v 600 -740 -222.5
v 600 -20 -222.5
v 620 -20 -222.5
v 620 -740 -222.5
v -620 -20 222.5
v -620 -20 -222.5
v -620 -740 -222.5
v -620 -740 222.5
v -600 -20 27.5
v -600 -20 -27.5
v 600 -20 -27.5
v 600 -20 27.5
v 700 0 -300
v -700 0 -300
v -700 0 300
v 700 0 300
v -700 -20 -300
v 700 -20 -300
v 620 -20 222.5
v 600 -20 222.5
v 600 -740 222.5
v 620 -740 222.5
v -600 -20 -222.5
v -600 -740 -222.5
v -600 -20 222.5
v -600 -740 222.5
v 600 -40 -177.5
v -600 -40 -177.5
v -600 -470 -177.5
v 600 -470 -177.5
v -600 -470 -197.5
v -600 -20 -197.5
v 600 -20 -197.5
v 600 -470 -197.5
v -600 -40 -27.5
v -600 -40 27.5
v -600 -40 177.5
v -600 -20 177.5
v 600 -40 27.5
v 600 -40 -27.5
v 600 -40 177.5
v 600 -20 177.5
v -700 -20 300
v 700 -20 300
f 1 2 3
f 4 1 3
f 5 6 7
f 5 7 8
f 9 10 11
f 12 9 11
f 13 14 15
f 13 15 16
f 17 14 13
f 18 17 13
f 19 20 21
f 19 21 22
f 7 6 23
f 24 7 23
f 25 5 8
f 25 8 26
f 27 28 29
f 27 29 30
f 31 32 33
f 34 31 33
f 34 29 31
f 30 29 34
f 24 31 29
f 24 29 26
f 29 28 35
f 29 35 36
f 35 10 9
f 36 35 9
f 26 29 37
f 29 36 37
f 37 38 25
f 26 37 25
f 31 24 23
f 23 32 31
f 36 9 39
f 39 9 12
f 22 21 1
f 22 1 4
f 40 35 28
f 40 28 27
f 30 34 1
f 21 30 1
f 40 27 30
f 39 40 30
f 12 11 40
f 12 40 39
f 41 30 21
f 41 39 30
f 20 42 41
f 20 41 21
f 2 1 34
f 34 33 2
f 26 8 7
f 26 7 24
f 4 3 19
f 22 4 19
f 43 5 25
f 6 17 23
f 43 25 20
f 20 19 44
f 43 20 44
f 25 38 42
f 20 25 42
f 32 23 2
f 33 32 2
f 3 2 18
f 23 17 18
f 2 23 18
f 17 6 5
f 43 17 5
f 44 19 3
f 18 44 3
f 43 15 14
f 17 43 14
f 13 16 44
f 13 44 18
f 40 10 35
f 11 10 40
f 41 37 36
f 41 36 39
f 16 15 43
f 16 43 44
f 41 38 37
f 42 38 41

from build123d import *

# Parameters (mm, degrees)
SKETCH1_W           = 1400
SKETCH1_H           = 600
BOSS_EXTRUDE1_DEPTH = 20
SKETCH2_W           = 20
SKETCH2_H           = 445
BOSS_EXTRUDE2_DEPTH = 720
SKETCH3_W           = 1200
SKETCH3_H           = 20
BOSS_EXTRUDE3_DEPTH = 450
SKETCH4_W           = 1200
SKETCH4_H           = 150
BOSS_EXTRUDE4_DEPTH = 20


with BuildPart() as part:
    # Sketch1 → Boss-Extrude1 (new body)
    with BuildSketch(Plane(origin=(0, 0, 0), x_dir=(1, 0, 0), z_dir=(0, 1, 0))):
        Rectangle(SKETCH1_W, SKETCH1_H)
    extrude(amount=-BOSS_EXTRUDE1_DEPTH)

    # Sketch2 → Boss-Extrude2 (add)
    with BuildSketch(Plane.XZ.offset(20)):
        with Locations((610, 0)):
            Rectangle(SKETCH2_W, SKETCH2_H)
        with Locations((-610, 0)):
            Rectangle(SKETCH2_W, SKETCH2_H)
    extrude(amount=BOSS_EXTRUDE2_DEPTH)

    # Sketch3 → Boss-Extrude3 (add)
    with BuildSketch(Plane.XZ.offset(20)):
        with Locations((0, -187.5)):
            Rectangle(SKETCH3_W, SKETCH3_H)
    extrude(amount=BOSS_EXTRUDE3_DEPTH)

    # Sketch4 → Boss-Extrude4 (add)
    with BuildSketch(Plane.XZ.offset(20)):
        with Locations((0, -102.5)):
            Rectangle(SKETCH4_W, SKETCH4_H)
        with Locations((0, 102.5)):
            Rectangle(SKETCH4_W, SKETCH4_H)
    extrude(amount=BOSS_EXTRUDE4_DEPTH)


solid = part.part
